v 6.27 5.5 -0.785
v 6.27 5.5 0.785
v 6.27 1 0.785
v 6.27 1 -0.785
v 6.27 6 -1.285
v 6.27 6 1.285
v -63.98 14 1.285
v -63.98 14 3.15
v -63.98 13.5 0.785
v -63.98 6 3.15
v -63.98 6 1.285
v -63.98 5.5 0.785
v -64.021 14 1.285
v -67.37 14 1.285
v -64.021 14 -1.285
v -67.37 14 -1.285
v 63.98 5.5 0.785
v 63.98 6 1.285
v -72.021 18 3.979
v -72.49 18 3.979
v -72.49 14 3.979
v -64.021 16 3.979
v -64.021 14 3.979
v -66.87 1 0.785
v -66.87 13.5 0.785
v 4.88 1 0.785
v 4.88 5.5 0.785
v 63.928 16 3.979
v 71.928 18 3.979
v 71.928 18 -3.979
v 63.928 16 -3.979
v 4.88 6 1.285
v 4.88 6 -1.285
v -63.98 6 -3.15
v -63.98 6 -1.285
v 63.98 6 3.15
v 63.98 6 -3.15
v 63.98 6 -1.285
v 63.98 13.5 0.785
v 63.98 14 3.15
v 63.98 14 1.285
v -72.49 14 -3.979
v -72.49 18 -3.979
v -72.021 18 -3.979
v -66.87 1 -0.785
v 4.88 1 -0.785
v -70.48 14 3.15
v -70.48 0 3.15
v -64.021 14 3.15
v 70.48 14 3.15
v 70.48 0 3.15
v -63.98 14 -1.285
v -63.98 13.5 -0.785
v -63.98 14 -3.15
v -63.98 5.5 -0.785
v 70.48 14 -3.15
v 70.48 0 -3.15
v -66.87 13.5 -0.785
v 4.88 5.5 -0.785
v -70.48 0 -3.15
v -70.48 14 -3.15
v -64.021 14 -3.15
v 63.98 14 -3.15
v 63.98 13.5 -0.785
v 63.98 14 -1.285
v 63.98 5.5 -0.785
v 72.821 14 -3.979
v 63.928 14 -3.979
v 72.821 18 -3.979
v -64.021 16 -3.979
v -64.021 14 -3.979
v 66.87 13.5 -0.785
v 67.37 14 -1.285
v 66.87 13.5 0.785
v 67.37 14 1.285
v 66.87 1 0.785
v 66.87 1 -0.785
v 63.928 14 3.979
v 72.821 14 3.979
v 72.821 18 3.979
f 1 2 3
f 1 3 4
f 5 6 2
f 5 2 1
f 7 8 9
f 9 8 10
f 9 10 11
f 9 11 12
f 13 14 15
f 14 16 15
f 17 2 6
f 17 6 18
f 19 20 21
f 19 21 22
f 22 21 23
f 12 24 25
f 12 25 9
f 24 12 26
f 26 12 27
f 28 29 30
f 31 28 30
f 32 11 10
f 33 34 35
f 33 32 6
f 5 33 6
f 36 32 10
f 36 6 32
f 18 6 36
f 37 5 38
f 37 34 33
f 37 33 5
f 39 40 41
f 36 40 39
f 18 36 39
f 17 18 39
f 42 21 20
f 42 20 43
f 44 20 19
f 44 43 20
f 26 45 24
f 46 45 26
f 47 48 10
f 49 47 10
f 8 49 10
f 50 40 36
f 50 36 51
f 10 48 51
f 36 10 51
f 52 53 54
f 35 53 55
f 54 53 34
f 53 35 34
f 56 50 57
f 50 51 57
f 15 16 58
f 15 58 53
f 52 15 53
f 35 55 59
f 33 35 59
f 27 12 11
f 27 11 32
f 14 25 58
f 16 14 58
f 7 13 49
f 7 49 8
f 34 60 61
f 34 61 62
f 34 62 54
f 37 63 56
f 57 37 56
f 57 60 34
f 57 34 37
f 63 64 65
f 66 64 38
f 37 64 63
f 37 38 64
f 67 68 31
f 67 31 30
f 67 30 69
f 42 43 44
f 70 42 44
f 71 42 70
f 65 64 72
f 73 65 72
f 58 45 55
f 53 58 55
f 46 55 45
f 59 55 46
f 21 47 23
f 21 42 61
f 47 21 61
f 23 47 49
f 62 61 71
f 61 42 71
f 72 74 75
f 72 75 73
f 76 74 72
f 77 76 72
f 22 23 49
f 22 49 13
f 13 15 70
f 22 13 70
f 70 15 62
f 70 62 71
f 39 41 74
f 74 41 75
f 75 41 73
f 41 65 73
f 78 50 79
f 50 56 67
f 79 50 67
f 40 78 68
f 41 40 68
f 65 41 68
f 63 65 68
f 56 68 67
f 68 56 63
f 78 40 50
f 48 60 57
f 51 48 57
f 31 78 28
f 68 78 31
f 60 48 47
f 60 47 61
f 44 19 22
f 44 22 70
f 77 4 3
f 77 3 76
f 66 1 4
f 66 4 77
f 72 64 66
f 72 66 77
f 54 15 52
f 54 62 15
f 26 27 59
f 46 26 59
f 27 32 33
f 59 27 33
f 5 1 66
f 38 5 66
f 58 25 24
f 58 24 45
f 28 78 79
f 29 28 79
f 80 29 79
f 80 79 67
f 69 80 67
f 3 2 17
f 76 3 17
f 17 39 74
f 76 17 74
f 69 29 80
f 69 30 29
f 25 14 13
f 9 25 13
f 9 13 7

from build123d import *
from OCP.BRepFilletAPI import BRepFilletAPI_MakeChamfer

# Parameters (mm, degrees)
SKETCH1_W           = 140.96
SKETCH1_H           = 6.3
BOSS_EXTRUDE1_DEPTH = 6
SKETCH2_W           = 6.5
SKETCH2_H           = 6.3
BOSS_EXTRUDE2_DEPTH = 8
SKETCH3_W           = 71.75
SKETCH3_H           = 1.57
SKETCH3_W_2         = 60.6
CUT_EXTRUDE1_DEPTH  = 13
CHAMFER1_SIZE       = 0.5
SKETCH5_W           = 8.468797777
SKETCH5_H           = 7.958933252
SKETCH5_W_2         = 8.892237666
BOSS_EXTRUDE3_DEPTH = 4
CHAMFER2_SIZE       = 2
CHAMFER2_SIZE2      = 8


with BuildPart() as part:
    # Sketch1 → Boss-Extrude1 (new body)
    with BuildSketch(Plane(origin=(0, 0, 0), x_dir=(1, 0, 0), z_dir=(0, 1, 0))):
        Rectangle(SKETCH1_W, SKETCH1_H)
    extrude(amount=BOSS_EXTRUDE1_DEPTH)

    # Sketch2 → Boss-Extrude2 (add)
    with BuildSketch(Plane(origin=(0, 6, 0), x_dir=(1, 0, 0), z_dir=(0, 1, 0))):
        with Locations((67.23, 0)):
            Rectangle(SKETCH2_W, SKETCH2_H)
        with Locations((-67.23, 0)):
            Rectangle(SKETCH2_W, SKETCH2_H)
    extrude(amount=BOSS_EXTRUDE2_DEPTH)

    # Sketch3 → Cut-Extrude1 (cut)
    with BuildSketch(Plane(origin=(0, 14, 0), x_dir=(1, 0, 0), z_dir=(0, 1, 0))):
        with Locations((-30.995, 0)):
            Rectangle(SKETCH3_W, SKETCH3_H)
        with Locations((36.57, 0)):
            Rectangle(SKETCH3_W_2, SKETCH3_H)
    extrude(amount=-CUT_EXTRUDE1_DEPTH, mode=Mode.SUBTRACT)

    # Chamfer1
    chamfer1_edges = [part.edges().sort_by_distance(p)[0] for p in [
        (-65.425, 14, -0.785),
        (65.425, 14, 0.785),
        (-65.425, 14, 0.785),
        (-66.87, 14, 0),
        (-29.55, 6, -0.785),
        (-29.55, 6, 0.785),
        (66.87, 14, 0),
        (65.425, 14, -0.785),
        (35.125, 6, 0.785),
        (35.125, 6, -0.785),
    ]]
    chamfer(chamfer1_edges, length=CHAMFER1_SIZE)

    # Sketch5 → Boss-Extrude3 (add)
    with BuildSketch(Plane(origin=(0, 14, 0), x_dir=(1, 0, 0), z_dir=(0, 1, 0))):
        with Locations((-68.255348276, 0)):
            Rectangle(SKETCH5_W, SKETCH5_H)
        with Locations((68.374589196, 0)):
            Rectangle(SKETCH5_W_2, SKETCH5_H)
    extrude(amount=BOSS_EXTRUDE3_DEPTH)

    # Chamfer2: one chamfer whose edges measure the first distance from different faces: ONE call of the kernel's chamfer builder (chamfer() names one face for all edges)
    chamfer2_edges_1 = [part.edges().sort_by_distance(p)[0] for p in [
        (-64.020949387, 18, 0),
    ]]
    chamfer2_side_1 = [part.faces().sort_by_distance(p)[0] for p in [
        (-64.020949387, 16, 0),
    ]]
    chamfer2_edges_2 = [part.edges().sort_by_distance(p)[0] for p in [
        (63.928470363, 18, 0),
    ]]
    chamfer2_side_2 = [part.faces().sort_by_distance(p)[0] for p in [
        (63.928470363, 16, 0),
    ]]
    chamfer2 = BRepFilletAPI_MakeChamfer(part.part.solid().wrapped)
    for e in chamfer2_edges_1:
        chamfer2.Add(CHAMFER2_SIZE, CHAMFER2_SIZE2, e.wrapped, chamfer2_side_1[0].wrapped)  # the first distance lies on this face
    for e in chamfer2_edges_2:
        chamfer2.Add(CHAMFER2_SIZE, CHAMFER2_SIZE2, e.wrapped, chamfer2_side_2[0].wrapped)  # the first distance lies on this face
    add(Compound.cast(chamfer2.Shape()), mode=Mode.REPLACE)


solid = part.part
